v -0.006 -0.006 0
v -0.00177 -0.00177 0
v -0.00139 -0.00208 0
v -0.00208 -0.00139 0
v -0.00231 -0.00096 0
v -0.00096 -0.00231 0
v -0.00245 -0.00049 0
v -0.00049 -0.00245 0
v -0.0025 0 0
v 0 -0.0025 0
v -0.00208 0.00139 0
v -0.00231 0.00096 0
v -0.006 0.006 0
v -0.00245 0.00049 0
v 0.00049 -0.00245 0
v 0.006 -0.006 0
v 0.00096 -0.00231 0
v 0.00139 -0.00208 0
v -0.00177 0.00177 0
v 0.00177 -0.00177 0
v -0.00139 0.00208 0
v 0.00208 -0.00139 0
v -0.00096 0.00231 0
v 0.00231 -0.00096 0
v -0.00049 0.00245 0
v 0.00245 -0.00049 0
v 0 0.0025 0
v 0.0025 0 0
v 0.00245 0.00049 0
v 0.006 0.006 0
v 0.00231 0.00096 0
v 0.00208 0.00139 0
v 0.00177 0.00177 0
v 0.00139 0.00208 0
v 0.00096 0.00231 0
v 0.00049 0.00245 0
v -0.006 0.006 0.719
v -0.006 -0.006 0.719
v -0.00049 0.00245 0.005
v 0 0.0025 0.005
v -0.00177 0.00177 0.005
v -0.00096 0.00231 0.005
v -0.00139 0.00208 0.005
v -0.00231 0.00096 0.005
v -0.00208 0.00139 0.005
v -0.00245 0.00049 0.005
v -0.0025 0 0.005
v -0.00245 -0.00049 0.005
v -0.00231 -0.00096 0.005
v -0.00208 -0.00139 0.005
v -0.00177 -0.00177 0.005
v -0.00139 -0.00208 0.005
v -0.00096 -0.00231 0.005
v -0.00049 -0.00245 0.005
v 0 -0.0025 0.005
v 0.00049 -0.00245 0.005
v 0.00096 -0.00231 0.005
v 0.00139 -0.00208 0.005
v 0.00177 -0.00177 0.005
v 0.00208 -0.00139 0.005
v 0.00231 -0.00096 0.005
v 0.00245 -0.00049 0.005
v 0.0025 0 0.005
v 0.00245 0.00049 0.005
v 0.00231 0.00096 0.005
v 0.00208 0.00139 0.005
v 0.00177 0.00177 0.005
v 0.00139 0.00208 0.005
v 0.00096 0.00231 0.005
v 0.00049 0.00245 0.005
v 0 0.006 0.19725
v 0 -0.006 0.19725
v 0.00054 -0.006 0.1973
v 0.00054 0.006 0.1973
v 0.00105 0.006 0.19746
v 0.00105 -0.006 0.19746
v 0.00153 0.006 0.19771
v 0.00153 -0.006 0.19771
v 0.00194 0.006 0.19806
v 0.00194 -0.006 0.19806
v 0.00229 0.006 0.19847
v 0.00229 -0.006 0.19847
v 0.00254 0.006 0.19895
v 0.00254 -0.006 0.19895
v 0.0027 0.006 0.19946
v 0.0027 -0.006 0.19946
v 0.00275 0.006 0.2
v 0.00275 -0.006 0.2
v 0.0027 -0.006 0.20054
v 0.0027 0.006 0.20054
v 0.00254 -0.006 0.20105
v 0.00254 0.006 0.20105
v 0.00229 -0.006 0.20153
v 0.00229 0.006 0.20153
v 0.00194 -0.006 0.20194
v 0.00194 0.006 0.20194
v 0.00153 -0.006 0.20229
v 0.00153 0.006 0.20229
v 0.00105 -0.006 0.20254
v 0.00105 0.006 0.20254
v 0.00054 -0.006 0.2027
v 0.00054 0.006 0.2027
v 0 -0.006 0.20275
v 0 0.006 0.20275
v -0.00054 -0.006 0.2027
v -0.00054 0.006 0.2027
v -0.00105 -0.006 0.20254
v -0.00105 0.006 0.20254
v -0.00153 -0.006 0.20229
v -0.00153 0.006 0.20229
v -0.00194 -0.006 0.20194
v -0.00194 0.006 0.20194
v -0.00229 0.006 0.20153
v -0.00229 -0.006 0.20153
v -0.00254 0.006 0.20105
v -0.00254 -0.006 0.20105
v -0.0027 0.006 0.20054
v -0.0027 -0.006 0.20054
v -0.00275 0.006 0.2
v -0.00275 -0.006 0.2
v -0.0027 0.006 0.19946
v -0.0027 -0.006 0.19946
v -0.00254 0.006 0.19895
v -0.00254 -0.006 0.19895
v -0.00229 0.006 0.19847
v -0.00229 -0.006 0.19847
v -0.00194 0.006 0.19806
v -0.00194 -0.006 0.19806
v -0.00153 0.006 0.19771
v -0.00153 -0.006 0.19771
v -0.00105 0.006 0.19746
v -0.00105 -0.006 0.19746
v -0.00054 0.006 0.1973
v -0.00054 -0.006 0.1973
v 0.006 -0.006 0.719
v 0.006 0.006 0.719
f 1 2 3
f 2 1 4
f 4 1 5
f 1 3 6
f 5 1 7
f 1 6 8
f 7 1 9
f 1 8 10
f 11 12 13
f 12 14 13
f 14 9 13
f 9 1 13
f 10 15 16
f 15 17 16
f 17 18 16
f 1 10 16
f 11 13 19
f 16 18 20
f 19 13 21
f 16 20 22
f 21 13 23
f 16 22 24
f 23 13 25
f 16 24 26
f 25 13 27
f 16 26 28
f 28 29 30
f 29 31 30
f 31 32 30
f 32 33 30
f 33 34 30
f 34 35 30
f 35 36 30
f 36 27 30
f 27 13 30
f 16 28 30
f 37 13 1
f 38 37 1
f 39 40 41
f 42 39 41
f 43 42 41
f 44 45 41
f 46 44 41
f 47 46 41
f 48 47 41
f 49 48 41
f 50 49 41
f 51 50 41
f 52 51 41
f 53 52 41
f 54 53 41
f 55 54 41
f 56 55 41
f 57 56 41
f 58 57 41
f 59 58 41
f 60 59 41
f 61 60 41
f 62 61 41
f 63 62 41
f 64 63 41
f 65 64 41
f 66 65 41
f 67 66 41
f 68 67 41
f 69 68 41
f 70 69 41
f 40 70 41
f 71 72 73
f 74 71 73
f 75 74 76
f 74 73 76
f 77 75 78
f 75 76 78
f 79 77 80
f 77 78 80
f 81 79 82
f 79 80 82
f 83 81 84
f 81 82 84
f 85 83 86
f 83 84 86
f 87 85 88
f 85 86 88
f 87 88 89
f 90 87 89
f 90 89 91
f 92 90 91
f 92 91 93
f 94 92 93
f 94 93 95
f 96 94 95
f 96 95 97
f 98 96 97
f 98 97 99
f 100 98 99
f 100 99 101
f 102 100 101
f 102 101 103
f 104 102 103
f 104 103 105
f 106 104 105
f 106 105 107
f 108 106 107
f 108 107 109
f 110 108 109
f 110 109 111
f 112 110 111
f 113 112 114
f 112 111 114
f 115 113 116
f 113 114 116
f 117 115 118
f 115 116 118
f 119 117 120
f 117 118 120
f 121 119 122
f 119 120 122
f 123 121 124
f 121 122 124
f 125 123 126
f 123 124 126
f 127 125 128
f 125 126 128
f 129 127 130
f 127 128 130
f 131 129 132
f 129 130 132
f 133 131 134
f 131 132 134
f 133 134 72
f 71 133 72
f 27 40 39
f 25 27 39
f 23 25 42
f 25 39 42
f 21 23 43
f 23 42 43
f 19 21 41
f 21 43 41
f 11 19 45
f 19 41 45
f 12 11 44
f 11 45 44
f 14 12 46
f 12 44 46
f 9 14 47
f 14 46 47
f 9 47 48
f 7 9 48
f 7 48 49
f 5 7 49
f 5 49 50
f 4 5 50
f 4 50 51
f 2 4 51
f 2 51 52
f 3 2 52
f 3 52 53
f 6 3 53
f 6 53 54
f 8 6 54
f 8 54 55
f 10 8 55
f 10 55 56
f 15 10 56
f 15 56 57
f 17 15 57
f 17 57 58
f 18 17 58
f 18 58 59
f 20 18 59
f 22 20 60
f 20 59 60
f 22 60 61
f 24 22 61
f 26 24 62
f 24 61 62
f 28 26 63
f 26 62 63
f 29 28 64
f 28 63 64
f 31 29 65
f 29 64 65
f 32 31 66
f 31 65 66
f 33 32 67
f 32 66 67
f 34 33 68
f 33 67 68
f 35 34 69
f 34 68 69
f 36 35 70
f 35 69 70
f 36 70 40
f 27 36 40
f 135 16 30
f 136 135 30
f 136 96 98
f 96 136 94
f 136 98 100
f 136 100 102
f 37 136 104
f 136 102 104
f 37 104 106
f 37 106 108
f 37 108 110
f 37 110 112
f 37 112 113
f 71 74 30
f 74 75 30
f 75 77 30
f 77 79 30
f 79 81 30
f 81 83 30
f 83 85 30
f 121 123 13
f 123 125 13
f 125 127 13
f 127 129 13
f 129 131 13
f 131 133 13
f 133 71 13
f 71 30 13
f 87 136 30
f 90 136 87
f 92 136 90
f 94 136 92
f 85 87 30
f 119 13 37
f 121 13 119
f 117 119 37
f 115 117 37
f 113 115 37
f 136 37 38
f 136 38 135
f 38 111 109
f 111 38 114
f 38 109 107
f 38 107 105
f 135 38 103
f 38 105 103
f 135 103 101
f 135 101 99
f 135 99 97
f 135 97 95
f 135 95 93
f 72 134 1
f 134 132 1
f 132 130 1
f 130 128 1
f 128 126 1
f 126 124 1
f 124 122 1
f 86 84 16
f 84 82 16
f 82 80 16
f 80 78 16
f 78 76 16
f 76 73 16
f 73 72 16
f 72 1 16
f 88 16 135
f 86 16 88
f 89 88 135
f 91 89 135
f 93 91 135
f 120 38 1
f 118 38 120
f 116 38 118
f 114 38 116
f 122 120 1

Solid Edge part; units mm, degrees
sketch "Sketch1" plane through (0, 0, 0) normal (0, 0, 1) x (1, 0, 0)
  line L0 (-0.006, -0.006) -> (0.006, -0.006)
  line L1 (0.006, -0.006) -> (0.006, 0.006)
  line L2 (0.006, 0.006) -> (-0.006, 0.006)
  line L3 (-0.006, 0.006) -> (-0.006, -0.006)
  dimension "D1" = 0.012
extrude "Protrusion1" add sketch "Sketch1" along normal blind 0.719
hole "Bohrung_1" at (0, -0.006, 0.2) direction (0, 1, 0) diameter 0.0055 end through all
hole "Bohrung_2" at (0, 0, 0) direction (0, 0, 1) diameter 0.005 depth 0.005
